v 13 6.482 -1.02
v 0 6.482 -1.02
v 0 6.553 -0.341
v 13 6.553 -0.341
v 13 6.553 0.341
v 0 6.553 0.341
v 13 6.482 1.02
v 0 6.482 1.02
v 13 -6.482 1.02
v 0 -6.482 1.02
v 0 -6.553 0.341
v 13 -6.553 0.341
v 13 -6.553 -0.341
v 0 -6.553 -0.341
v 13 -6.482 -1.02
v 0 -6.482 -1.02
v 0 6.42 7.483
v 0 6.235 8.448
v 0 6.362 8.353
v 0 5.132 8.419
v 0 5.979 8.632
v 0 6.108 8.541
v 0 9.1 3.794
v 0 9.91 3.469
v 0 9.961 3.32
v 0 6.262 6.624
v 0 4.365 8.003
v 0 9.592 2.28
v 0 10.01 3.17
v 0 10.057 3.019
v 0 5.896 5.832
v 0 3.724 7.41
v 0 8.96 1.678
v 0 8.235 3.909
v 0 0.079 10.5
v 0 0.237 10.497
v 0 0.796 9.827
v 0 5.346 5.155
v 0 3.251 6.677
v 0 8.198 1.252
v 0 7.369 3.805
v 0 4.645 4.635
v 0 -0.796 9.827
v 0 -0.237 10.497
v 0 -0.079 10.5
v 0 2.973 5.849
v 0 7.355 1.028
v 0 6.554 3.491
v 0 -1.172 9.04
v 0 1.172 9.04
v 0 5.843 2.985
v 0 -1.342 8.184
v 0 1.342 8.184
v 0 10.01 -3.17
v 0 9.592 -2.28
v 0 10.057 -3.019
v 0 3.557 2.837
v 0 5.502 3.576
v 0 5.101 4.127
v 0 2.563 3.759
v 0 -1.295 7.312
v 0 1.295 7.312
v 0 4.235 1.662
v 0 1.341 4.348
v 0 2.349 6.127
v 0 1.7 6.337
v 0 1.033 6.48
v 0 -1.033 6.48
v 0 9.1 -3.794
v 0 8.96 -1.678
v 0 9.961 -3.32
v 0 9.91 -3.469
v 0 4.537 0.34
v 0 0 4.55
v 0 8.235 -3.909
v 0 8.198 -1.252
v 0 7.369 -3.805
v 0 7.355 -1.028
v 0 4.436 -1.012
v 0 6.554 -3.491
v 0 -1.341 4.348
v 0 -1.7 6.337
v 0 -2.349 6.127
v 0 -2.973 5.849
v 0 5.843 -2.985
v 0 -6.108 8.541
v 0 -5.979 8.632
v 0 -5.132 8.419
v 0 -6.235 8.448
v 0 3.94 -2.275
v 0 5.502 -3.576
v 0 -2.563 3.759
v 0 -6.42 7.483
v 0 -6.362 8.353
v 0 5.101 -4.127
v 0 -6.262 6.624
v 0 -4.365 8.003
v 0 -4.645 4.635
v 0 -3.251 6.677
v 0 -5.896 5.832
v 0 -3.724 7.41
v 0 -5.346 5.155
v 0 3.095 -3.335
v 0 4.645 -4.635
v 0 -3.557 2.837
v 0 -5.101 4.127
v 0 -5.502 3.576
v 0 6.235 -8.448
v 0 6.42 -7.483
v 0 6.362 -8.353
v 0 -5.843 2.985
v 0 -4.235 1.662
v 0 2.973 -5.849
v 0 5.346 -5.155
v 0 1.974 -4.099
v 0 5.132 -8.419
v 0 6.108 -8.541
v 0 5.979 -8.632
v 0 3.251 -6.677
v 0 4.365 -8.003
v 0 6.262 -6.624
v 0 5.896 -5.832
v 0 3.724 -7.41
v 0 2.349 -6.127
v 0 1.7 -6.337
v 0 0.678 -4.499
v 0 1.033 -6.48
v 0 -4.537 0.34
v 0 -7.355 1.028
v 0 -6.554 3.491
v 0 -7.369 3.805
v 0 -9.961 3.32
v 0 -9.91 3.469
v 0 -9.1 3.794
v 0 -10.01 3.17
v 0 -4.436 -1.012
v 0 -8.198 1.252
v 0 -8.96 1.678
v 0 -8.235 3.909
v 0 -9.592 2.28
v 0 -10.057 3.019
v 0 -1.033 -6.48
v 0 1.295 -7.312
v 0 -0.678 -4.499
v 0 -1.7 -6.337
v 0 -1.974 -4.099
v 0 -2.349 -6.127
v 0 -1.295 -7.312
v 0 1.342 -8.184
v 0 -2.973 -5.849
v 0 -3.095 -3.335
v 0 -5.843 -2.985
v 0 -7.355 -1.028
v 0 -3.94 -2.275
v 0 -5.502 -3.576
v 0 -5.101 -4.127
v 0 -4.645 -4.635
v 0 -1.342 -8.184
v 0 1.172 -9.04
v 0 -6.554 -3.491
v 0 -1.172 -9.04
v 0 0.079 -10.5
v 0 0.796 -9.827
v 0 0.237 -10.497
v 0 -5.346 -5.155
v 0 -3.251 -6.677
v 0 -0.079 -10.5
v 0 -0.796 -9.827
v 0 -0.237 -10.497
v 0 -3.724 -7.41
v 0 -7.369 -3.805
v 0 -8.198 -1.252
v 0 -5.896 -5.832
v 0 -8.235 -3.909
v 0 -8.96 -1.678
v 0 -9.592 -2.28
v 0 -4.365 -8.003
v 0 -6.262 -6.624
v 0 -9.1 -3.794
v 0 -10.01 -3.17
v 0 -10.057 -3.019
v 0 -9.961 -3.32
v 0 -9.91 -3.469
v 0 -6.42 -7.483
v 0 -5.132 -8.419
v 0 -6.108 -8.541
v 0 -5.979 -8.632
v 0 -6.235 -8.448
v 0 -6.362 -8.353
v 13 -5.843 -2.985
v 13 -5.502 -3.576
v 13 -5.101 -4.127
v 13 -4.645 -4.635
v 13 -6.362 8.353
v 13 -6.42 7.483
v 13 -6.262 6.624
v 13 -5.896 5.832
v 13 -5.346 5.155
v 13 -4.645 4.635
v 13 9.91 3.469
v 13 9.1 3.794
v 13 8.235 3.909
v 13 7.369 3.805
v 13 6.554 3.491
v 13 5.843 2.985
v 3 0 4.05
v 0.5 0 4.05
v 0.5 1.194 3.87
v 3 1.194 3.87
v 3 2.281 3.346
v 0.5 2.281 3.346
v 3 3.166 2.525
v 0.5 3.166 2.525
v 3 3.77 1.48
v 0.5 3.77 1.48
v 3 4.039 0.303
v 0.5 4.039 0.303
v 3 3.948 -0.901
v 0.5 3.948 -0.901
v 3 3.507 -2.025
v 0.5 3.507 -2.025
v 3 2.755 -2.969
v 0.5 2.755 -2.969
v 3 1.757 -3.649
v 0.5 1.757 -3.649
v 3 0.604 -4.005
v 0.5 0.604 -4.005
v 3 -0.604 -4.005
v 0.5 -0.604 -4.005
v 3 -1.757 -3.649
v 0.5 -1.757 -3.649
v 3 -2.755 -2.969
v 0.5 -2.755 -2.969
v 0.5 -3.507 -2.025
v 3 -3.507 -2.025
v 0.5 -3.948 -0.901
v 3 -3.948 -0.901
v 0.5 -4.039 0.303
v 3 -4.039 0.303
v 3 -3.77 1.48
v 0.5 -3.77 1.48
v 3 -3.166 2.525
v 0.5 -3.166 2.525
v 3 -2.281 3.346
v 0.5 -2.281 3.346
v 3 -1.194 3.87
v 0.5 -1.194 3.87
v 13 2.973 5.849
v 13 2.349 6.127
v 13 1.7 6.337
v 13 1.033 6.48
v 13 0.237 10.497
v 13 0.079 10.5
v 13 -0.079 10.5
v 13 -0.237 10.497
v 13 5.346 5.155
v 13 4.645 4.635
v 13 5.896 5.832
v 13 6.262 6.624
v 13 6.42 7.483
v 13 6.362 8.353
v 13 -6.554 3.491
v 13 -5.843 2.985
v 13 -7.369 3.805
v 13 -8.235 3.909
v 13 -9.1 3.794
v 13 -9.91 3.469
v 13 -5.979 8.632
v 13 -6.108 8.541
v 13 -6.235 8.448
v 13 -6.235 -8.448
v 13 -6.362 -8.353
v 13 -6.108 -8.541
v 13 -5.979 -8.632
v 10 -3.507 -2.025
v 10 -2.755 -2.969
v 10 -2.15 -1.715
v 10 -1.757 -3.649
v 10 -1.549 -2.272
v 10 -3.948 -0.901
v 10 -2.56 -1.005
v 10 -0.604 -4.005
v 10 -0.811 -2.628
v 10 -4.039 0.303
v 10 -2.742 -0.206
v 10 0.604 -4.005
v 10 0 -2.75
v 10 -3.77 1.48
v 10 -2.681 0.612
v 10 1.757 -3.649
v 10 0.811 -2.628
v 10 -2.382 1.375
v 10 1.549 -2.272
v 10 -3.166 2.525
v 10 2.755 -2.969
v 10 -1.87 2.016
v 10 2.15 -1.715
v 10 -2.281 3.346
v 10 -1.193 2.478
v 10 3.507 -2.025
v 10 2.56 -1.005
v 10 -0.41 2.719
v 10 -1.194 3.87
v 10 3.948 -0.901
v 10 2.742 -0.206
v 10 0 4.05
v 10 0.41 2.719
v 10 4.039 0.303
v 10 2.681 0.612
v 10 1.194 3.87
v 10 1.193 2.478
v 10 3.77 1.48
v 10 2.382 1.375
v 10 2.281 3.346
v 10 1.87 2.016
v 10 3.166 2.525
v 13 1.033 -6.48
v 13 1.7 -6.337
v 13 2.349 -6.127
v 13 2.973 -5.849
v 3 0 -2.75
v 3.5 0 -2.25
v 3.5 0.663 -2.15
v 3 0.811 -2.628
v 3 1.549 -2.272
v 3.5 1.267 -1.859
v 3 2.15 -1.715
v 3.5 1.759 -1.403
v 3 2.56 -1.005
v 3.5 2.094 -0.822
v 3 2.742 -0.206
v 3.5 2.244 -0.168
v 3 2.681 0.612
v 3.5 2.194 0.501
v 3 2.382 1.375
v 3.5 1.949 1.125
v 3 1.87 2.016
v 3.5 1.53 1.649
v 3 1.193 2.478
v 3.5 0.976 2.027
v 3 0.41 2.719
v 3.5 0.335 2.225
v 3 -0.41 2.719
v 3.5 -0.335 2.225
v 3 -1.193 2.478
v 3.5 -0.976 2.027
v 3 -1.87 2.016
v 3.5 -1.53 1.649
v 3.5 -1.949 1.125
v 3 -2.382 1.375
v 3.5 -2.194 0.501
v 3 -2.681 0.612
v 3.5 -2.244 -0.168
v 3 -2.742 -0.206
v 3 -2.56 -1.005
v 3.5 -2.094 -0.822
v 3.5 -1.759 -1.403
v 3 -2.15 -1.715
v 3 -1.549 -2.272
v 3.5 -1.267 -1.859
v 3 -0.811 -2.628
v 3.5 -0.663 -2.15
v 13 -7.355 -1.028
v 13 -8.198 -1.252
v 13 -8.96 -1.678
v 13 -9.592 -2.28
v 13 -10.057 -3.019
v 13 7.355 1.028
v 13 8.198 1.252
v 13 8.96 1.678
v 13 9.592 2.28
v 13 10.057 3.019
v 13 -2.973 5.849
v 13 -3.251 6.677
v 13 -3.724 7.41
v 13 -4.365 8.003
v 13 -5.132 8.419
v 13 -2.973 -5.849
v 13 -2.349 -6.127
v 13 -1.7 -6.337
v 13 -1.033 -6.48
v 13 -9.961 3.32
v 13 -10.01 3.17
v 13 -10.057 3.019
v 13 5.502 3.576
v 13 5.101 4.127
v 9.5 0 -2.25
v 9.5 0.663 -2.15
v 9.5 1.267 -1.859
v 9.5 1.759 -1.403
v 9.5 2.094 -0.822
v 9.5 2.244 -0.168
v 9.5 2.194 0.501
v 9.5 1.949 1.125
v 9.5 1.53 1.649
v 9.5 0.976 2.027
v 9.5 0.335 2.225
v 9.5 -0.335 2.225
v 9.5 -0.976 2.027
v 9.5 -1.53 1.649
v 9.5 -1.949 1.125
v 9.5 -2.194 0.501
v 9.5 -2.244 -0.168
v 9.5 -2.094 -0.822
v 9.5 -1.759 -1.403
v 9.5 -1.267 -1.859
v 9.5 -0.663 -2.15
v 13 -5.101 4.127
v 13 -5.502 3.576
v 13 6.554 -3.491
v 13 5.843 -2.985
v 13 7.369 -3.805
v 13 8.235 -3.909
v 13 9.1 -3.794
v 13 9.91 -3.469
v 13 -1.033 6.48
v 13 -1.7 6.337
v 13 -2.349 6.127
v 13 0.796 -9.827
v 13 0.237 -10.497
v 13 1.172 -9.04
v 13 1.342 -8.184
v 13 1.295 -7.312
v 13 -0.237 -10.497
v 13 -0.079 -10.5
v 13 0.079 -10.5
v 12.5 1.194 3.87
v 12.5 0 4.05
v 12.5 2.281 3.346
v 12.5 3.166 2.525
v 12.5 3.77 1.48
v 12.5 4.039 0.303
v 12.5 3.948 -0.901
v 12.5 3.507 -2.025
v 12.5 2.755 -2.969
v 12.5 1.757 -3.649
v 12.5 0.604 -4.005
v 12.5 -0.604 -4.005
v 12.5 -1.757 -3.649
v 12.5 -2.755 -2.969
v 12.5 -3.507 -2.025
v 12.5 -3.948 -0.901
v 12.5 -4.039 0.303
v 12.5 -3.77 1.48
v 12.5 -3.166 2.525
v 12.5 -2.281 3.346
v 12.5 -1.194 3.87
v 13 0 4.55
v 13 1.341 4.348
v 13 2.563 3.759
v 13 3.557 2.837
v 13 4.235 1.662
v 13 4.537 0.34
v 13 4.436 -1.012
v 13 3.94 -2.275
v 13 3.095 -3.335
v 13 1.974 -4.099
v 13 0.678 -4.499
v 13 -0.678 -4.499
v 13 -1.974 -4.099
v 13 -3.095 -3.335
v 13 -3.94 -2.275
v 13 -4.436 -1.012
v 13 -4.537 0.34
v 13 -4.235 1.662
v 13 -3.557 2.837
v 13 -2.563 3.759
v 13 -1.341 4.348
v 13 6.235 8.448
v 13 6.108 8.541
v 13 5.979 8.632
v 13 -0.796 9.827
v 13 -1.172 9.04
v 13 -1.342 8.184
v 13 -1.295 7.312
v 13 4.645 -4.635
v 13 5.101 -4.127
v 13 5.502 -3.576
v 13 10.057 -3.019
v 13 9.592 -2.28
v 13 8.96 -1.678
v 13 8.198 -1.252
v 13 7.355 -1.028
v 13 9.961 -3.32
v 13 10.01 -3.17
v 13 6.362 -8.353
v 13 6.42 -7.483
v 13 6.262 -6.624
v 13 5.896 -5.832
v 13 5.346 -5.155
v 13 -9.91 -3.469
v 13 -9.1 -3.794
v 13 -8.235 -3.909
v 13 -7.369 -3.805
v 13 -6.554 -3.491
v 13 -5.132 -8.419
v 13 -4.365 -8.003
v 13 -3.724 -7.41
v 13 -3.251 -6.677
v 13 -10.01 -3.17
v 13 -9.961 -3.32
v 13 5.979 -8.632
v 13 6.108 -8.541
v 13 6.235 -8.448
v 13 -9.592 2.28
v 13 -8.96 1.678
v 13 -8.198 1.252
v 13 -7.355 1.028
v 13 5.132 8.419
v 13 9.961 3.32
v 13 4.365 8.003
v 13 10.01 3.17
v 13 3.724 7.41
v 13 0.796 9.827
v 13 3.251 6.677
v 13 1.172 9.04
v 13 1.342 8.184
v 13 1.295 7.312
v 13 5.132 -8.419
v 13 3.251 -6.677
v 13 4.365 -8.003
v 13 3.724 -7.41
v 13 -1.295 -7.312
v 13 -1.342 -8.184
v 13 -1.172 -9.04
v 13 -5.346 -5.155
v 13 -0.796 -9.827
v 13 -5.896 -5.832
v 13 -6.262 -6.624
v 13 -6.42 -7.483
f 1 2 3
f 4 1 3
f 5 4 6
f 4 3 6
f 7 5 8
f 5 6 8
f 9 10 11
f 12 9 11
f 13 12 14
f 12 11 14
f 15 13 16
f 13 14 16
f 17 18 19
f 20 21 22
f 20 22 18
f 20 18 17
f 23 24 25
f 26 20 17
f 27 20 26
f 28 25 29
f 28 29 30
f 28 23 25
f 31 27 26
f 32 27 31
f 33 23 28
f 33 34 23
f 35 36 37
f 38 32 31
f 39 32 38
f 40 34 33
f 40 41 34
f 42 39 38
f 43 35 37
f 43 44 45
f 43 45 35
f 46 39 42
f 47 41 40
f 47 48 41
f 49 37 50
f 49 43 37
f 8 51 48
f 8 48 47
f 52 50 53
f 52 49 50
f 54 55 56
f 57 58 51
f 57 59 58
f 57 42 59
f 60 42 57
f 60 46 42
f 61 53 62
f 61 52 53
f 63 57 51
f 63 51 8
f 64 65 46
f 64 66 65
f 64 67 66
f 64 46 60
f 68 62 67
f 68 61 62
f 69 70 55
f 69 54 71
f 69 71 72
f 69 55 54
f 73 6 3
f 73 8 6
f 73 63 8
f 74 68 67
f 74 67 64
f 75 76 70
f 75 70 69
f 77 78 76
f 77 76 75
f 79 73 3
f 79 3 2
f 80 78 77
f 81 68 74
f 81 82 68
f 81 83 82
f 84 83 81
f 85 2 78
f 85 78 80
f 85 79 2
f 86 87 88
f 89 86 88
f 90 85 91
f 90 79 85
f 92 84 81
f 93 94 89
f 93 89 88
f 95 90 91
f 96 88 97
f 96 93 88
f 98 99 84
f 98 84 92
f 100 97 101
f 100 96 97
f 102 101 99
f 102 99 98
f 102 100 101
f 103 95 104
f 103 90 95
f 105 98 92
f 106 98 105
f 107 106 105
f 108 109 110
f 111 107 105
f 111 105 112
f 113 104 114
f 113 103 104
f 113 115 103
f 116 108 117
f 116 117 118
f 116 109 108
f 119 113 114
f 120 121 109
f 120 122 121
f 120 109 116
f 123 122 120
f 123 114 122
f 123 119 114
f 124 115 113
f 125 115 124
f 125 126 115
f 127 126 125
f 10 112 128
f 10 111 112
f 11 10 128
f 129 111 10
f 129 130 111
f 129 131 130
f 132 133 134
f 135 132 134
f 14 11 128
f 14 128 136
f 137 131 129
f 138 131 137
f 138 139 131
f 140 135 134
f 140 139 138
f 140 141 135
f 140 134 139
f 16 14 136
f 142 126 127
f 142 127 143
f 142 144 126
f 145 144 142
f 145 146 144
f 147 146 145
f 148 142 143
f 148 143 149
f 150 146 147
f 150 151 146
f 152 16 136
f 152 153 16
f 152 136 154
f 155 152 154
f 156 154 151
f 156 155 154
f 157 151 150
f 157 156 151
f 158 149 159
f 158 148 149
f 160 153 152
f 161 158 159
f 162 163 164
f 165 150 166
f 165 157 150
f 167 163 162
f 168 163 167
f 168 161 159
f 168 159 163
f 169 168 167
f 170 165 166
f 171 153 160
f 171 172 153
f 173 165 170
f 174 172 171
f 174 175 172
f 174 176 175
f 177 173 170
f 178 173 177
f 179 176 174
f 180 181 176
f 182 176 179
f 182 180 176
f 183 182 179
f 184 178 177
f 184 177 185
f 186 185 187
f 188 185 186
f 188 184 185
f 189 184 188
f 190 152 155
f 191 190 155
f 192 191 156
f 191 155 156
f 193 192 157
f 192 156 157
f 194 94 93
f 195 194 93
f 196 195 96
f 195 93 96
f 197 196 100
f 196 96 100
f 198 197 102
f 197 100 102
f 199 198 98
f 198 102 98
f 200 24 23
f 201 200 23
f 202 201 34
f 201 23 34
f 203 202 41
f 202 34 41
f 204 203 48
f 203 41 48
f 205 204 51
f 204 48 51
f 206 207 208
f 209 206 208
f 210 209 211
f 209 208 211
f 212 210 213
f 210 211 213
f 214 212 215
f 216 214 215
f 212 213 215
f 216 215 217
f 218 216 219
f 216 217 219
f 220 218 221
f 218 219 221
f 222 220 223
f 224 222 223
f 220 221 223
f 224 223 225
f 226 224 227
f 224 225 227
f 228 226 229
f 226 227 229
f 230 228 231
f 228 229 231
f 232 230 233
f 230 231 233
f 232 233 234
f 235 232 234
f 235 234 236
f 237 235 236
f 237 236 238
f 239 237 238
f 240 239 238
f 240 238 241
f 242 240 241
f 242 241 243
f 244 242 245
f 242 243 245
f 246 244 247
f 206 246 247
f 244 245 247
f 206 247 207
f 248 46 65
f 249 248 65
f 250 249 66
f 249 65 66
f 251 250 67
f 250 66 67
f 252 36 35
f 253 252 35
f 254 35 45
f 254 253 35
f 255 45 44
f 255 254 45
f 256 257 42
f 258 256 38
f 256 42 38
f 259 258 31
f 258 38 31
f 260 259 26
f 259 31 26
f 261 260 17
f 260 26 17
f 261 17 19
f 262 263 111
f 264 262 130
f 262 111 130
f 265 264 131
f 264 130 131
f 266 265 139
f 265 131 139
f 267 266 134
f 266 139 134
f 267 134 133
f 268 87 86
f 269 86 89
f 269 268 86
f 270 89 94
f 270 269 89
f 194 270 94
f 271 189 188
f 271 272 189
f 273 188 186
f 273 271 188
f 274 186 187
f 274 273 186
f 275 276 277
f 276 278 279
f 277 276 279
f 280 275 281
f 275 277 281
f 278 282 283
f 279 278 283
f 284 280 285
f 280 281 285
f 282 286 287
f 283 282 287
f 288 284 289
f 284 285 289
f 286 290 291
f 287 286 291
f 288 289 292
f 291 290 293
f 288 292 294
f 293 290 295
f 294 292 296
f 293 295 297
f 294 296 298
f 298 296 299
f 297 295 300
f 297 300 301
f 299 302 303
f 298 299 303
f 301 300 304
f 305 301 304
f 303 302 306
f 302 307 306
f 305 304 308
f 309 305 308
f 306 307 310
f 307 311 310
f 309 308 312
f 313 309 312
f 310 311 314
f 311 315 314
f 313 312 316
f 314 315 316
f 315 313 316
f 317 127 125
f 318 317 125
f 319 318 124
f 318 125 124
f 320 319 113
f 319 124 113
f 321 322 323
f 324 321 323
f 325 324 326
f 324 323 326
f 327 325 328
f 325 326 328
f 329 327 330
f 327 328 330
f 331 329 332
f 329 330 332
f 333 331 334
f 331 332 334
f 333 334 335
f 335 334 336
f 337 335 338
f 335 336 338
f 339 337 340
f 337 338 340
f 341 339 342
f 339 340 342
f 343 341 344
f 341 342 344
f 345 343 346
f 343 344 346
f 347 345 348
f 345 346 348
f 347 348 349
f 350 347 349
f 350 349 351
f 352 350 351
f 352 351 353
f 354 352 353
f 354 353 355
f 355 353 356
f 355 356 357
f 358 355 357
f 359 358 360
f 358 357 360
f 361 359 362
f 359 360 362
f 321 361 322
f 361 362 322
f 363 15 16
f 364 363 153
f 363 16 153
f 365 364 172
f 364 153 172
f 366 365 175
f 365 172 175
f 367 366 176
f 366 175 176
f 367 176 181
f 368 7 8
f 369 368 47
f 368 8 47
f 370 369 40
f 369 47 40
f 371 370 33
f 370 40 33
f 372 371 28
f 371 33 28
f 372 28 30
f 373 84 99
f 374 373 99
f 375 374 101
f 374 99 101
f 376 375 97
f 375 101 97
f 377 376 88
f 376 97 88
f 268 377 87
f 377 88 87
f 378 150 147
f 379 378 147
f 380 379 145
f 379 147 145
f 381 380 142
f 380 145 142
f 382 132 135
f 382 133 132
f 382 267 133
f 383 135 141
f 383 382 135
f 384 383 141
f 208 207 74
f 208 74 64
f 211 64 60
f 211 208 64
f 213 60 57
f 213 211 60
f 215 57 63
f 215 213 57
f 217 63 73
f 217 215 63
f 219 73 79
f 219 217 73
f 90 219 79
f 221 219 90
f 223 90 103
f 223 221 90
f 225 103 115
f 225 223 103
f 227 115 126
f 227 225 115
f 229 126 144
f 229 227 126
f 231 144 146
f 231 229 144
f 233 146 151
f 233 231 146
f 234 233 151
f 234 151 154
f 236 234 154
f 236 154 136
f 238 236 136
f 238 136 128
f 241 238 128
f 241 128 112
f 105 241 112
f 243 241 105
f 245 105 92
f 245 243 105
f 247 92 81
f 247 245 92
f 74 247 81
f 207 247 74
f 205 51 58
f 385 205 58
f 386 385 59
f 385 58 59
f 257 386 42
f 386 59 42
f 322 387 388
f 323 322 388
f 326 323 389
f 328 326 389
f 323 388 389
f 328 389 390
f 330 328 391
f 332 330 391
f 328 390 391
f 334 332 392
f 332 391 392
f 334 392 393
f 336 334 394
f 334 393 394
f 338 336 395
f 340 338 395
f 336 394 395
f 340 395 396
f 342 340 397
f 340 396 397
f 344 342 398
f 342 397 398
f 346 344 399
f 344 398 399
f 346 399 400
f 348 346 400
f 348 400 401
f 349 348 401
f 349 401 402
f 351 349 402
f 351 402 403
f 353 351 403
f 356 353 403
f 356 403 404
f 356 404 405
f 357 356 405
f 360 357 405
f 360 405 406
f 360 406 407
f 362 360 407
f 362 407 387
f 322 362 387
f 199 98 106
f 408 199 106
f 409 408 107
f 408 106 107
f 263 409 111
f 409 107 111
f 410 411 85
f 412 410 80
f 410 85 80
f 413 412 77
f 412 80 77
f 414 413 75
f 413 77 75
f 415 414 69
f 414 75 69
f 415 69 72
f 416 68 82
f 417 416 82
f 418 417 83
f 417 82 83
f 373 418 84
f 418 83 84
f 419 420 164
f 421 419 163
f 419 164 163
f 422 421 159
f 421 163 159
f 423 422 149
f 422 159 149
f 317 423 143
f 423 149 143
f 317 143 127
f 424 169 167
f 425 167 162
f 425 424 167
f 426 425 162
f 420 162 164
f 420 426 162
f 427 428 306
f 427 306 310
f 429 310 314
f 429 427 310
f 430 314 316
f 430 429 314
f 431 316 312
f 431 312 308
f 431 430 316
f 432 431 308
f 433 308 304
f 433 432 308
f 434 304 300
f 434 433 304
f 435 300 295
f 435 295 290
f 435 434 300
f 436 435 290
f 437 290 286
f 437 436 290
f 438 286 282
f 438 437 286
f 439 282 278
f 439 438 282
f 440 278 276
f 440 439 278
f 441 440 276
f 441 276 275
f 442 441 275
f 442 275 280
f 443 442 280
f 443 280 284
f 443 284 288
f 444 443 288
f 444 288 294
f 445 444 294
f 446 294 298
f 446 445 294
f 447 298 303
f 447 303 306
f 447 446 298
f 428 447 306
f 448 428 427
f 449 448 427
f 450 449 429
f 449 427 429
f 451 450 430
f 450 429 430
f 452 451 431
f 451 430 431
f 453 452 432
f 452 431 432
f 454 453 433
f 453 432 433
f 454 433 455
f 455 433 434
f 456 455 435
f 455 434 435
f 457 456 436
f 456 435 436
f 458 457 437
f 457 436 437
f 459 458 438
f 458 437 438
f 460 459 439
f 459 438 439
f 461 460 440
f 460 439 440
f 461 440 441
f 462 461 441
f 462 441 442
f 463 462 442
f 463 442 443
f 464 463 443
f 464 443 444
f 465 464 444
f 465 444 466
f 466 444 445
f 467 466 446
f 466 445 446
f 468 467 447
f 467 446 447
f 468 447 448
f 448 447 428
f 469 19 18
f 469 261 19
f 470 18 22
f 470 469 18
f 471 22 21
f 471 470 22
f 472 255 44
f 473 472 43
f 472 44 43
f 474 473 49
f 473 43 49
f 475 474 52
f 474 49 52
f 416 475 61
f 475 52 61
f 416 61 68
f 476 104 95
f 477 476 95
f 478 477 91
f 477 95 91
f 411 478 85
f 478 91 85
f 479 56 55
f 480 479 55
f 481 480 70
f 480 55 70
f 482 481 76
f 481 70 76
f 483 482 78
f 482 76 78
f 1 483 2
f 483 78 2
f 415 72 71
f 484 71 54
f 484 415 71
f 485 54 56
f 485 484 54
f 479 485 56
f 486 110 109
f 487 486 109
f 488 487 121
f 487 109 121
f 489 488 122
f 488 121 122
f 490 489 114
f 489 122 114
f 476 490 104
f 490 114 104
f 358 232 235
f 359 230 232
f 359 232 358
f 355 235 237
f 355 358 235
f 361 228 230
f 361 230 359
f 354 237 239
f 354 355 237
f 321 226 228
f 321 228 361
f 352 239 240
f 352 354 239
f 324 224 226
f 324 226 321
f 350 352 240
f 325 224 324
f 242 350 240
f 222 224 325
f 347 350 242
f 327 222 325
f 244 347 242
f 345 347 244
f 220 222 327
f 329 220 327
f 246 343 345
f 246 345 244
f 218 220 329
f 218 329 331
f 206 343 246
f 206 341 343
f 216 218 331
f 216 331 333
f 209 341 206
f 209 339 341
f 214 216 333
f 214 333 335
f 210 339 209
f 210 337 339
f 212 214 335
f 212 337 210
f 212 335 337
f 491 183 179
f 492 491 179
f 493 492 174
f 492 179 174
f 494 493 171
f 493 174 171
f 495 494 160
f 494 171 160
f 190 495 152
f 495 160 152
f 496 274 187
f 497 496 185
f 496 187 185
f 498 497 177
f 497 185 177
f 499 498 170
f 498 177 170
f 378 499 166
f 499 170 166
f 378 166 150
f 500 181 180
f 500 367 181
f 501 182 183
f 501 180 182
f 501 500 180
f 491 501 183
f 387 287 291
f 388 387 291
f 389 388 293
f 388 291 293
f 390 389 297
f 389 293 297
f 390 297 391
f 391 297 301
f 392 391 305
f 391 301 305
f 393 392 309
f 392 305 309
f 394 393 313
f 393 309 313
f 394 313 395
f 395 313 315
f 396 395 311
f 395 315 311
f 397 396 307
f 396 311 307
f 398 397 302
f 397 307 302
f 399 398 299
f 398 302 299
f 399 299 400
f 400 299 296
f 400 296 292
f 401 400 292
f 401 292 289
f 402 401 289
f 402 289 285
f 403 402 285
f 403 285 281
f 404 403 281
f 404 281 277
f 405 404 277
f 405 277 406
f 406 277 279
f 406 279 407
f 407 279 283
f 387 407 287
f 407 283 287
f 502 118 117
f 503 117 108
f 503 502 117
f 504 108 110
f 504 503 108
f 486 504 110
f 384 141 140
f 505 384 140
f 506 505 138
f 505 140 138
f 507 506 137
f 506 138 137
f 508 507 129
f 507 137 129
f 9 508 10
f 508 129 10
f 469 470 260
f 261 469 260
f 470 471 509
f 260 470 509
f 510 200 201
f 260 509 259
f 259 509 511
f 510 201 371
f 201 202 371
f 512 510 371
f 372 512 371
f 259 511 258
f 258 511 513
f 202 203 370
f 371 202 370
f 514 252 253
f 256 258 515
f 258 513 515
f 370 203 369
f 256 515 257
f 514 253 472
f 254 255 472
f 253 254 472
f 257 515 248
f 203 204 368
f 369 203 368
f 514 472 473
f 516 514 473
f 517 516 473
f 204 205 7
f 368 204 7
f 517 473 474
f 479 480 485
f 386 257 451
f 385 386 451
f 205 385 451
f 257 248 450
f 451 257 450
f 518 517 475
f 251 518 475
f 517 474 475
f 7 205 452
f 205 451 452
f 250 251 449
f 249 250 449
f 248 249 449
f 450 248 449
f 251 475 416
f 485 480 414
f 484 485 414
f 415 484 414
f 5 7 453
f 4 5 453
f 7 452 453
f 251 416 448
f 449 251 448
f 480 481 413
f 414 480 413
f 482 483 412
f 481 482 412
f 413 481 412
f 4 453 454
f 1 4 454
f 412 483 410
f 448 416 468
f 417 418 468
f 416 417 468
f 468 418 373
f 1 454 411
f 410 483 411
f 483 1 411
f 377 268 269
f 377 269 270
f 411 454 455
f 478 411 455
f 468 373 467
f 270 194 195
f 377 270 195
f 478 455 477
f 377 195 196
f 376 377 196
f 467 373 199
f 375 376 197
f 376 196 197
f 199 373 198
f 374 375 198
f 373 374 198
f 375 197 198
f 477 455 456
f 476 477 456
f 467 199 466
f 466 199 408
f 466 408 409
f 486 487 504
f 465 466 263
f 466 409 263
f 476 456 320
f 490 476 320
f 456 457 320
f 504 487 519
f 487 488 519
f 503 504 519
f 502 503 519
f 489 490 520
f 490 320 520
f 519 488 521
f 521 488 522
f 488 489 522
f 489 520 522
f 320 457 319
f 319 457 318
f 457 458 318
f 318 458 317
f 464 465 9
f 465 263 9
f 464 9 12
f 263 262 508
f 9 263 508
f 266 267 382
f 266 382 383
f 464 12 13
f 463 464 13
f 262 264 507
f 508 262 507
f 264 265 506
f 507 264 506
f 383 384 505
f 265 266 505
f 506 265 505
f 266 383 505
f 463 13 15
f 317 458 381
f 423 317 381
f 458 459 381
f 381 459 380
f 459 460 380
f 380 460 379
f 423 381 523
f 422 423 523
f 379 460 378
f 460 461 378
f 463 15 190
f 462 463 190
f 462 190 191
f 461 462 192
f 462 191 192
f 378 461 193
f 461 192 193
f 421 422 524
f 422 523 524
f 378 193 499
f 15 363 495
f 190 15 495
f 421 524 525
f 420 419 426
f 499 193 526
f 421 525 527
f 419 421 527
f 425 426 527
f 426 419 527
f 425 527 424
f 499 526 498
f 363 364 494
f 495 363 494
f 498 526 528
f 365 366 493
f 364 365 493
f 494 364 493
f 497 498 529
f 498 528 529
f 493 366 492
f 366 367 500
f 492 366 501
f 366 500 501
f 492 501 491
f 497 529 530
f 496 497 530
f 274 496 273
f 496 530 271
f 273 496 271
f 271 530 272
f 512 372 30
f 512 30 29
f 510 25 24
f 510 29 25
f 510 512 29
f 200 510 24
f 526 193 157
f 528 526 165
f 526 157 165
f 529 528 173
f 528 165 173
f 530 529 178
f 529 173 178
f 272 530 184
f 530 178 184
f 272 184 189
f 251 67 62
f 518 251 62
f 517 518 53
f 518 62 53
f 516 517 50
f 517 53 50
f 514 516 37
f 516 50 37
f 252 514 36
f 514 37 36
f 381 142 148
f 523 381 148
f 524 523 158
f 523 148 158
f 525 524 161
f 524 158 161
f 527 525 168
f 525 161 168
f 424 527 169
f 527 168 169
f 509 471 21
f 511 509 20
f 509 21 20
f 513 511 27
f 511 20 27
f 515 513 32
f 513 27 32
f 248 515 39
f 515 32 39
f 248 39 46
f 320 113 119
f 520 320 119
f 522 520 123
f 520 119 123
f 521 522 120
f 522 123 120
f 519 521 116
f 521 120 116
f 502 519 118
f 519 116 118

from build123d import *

# Parameters (mm, degrees)
BASPROSKE_W        = 13
BASPROSKE_H        = 10.5
TOOTHCUT_DEPTH     = 20.735754356
TEETHCUTS_COUNT    = 10
TEETHCUTS_ANGLE    = 324
BORSKE_R           = 1.5
BORE_DEPTH         = 50.0000508
SKETCH1_R          = 4.05
CUT_EXTRUDE1_DEPTH = 3
CUT_EXTRUDE2_REACH = 19.646
SKETCH2_R          = 2.25
CHAMFER1_SIZE      = 0.5


with BuildPart() as part:
    # BasProSke → Base-Revolve (revolve)
    with BuildSketch(Plane(origin=(0, 0, 0), x_dir=(1, 0, 0), z_dir=(0, 1, 0)), mode=Mode.PRIVATE) as base_revolve_sk:
        with Locations((6.5, 5.25)):
            Rectangle(BASPROSKE_W, BASPROSKE_H)
    revolve(base_revolve_sk.sketch.rotate(Axis((-10, 0, 0), (1, 0, 0)), 180), axis=Axis((-10, 0, 0), (1, 0, 0)))

    # TooCutSke → ToothCut (cut, through all)
    with BuildSketch(Plane(origin=(0, 0, 0), x_dir=(0, 0, -1), z_dir=(1, 0, 0))):
        with BuildLine():
            ThreePointArc((1.019600066, 6.481797432), (0, 6.5615), (-1.019600066, 6.481797432))
            ThreePointArc((-1.019600066, 6.481797432), (-1.451036104, 8.608938557), (-3.053606956, 10.072712133))
            ThreePointArc((-3.053606956, 10.072712133), (0, 10.5254), (3.053606956, 10.072712133))
            ThreePointArc((3.053606956, 10.072712133), (1.451036104, 8.608938557), (1.019600066, 6.481797432))
        make_face()
    toothcut = extrude(amount=TOOTHCUT_DEPTH, mode=Mode.SUBTRACT)

    # TeethCuts: ToothCut ×10 about axis
    teethcuts_axis = Axis((-10, 0, 0), (1, 0, 0))
    for i in range(1, TEETHCUTS_COUNT):
        add(toothcut.rotate(teethcuts_axis, i * TEETHCUTS_ANGLE / (TEETHCUTS_COUNT - 1)), mode=Mode.SUBTRACT)

    # BorSke → Bore (cut, symmetric)
    with BuildSketch(Plane(origin=(0, 0, 0), x_dir=(0, 0, -1), z_dir=(1, 0, 0))):
        with Locations(Location((0, 0, 0), (0, 0, 180))):
            Circle(BORSKE_R)
    extrude(amount=BORE_DEPTH, both=True, mode=Mode.SUBTRACT)

    # Sketch1 → Cut-Extrude1 (cut)
    with BuildSketch(Plane.ZY):
        Circle(SKETCH1_R)
    cut_extrude1 = extrude(amount=-CUT_EXTRUDE1_DEPTH, mode=Mode.SUBTRACT)

    # Mirror1: Cut-Extrude1 across plane
    add(cut_extrude1.mirror(Plane(origin=(6.5, 0, 0), x_dir=(0, 0, 1), z_dir=(1, 0, 0))), mode=Mode.SUBTRACT)

    # Sketch2 → Cut-Extrude2 (cut, up to next)
    with BuildSketch(Plane(origin=(10, 0, 0), x_dir=(0, 0, -1), z_dir=(1, 0, 0)), mode=Mode.PRIVATE) as cut_extrude2_sk1:
        Circle(SKETCH2_R)
    cut_extrude2_tool1 = extrude(cut_extrude2_sk1.sketch, amount=-CUT_EXTRUDE2_REACH, mode=Mode.PRIVATE) & part.part
    add(cut_extrude2_tool1.solids().sort_by_distance((10, 0, 0))[0], mode=Mode.SUBTRACT)

    # Chamfer1
    chamfer1_edges = [part.edges().sort_by_distance(p)[0] for p in [
        (0, 0, -4.05),
        (13, 0, -4.05),
        (3, 0, 2.25),
        (10, 0, 2.25),
    ]]
    chamfer(chamfer1_edges, length=CHAMFER1_SIZE)


solid = part.part
